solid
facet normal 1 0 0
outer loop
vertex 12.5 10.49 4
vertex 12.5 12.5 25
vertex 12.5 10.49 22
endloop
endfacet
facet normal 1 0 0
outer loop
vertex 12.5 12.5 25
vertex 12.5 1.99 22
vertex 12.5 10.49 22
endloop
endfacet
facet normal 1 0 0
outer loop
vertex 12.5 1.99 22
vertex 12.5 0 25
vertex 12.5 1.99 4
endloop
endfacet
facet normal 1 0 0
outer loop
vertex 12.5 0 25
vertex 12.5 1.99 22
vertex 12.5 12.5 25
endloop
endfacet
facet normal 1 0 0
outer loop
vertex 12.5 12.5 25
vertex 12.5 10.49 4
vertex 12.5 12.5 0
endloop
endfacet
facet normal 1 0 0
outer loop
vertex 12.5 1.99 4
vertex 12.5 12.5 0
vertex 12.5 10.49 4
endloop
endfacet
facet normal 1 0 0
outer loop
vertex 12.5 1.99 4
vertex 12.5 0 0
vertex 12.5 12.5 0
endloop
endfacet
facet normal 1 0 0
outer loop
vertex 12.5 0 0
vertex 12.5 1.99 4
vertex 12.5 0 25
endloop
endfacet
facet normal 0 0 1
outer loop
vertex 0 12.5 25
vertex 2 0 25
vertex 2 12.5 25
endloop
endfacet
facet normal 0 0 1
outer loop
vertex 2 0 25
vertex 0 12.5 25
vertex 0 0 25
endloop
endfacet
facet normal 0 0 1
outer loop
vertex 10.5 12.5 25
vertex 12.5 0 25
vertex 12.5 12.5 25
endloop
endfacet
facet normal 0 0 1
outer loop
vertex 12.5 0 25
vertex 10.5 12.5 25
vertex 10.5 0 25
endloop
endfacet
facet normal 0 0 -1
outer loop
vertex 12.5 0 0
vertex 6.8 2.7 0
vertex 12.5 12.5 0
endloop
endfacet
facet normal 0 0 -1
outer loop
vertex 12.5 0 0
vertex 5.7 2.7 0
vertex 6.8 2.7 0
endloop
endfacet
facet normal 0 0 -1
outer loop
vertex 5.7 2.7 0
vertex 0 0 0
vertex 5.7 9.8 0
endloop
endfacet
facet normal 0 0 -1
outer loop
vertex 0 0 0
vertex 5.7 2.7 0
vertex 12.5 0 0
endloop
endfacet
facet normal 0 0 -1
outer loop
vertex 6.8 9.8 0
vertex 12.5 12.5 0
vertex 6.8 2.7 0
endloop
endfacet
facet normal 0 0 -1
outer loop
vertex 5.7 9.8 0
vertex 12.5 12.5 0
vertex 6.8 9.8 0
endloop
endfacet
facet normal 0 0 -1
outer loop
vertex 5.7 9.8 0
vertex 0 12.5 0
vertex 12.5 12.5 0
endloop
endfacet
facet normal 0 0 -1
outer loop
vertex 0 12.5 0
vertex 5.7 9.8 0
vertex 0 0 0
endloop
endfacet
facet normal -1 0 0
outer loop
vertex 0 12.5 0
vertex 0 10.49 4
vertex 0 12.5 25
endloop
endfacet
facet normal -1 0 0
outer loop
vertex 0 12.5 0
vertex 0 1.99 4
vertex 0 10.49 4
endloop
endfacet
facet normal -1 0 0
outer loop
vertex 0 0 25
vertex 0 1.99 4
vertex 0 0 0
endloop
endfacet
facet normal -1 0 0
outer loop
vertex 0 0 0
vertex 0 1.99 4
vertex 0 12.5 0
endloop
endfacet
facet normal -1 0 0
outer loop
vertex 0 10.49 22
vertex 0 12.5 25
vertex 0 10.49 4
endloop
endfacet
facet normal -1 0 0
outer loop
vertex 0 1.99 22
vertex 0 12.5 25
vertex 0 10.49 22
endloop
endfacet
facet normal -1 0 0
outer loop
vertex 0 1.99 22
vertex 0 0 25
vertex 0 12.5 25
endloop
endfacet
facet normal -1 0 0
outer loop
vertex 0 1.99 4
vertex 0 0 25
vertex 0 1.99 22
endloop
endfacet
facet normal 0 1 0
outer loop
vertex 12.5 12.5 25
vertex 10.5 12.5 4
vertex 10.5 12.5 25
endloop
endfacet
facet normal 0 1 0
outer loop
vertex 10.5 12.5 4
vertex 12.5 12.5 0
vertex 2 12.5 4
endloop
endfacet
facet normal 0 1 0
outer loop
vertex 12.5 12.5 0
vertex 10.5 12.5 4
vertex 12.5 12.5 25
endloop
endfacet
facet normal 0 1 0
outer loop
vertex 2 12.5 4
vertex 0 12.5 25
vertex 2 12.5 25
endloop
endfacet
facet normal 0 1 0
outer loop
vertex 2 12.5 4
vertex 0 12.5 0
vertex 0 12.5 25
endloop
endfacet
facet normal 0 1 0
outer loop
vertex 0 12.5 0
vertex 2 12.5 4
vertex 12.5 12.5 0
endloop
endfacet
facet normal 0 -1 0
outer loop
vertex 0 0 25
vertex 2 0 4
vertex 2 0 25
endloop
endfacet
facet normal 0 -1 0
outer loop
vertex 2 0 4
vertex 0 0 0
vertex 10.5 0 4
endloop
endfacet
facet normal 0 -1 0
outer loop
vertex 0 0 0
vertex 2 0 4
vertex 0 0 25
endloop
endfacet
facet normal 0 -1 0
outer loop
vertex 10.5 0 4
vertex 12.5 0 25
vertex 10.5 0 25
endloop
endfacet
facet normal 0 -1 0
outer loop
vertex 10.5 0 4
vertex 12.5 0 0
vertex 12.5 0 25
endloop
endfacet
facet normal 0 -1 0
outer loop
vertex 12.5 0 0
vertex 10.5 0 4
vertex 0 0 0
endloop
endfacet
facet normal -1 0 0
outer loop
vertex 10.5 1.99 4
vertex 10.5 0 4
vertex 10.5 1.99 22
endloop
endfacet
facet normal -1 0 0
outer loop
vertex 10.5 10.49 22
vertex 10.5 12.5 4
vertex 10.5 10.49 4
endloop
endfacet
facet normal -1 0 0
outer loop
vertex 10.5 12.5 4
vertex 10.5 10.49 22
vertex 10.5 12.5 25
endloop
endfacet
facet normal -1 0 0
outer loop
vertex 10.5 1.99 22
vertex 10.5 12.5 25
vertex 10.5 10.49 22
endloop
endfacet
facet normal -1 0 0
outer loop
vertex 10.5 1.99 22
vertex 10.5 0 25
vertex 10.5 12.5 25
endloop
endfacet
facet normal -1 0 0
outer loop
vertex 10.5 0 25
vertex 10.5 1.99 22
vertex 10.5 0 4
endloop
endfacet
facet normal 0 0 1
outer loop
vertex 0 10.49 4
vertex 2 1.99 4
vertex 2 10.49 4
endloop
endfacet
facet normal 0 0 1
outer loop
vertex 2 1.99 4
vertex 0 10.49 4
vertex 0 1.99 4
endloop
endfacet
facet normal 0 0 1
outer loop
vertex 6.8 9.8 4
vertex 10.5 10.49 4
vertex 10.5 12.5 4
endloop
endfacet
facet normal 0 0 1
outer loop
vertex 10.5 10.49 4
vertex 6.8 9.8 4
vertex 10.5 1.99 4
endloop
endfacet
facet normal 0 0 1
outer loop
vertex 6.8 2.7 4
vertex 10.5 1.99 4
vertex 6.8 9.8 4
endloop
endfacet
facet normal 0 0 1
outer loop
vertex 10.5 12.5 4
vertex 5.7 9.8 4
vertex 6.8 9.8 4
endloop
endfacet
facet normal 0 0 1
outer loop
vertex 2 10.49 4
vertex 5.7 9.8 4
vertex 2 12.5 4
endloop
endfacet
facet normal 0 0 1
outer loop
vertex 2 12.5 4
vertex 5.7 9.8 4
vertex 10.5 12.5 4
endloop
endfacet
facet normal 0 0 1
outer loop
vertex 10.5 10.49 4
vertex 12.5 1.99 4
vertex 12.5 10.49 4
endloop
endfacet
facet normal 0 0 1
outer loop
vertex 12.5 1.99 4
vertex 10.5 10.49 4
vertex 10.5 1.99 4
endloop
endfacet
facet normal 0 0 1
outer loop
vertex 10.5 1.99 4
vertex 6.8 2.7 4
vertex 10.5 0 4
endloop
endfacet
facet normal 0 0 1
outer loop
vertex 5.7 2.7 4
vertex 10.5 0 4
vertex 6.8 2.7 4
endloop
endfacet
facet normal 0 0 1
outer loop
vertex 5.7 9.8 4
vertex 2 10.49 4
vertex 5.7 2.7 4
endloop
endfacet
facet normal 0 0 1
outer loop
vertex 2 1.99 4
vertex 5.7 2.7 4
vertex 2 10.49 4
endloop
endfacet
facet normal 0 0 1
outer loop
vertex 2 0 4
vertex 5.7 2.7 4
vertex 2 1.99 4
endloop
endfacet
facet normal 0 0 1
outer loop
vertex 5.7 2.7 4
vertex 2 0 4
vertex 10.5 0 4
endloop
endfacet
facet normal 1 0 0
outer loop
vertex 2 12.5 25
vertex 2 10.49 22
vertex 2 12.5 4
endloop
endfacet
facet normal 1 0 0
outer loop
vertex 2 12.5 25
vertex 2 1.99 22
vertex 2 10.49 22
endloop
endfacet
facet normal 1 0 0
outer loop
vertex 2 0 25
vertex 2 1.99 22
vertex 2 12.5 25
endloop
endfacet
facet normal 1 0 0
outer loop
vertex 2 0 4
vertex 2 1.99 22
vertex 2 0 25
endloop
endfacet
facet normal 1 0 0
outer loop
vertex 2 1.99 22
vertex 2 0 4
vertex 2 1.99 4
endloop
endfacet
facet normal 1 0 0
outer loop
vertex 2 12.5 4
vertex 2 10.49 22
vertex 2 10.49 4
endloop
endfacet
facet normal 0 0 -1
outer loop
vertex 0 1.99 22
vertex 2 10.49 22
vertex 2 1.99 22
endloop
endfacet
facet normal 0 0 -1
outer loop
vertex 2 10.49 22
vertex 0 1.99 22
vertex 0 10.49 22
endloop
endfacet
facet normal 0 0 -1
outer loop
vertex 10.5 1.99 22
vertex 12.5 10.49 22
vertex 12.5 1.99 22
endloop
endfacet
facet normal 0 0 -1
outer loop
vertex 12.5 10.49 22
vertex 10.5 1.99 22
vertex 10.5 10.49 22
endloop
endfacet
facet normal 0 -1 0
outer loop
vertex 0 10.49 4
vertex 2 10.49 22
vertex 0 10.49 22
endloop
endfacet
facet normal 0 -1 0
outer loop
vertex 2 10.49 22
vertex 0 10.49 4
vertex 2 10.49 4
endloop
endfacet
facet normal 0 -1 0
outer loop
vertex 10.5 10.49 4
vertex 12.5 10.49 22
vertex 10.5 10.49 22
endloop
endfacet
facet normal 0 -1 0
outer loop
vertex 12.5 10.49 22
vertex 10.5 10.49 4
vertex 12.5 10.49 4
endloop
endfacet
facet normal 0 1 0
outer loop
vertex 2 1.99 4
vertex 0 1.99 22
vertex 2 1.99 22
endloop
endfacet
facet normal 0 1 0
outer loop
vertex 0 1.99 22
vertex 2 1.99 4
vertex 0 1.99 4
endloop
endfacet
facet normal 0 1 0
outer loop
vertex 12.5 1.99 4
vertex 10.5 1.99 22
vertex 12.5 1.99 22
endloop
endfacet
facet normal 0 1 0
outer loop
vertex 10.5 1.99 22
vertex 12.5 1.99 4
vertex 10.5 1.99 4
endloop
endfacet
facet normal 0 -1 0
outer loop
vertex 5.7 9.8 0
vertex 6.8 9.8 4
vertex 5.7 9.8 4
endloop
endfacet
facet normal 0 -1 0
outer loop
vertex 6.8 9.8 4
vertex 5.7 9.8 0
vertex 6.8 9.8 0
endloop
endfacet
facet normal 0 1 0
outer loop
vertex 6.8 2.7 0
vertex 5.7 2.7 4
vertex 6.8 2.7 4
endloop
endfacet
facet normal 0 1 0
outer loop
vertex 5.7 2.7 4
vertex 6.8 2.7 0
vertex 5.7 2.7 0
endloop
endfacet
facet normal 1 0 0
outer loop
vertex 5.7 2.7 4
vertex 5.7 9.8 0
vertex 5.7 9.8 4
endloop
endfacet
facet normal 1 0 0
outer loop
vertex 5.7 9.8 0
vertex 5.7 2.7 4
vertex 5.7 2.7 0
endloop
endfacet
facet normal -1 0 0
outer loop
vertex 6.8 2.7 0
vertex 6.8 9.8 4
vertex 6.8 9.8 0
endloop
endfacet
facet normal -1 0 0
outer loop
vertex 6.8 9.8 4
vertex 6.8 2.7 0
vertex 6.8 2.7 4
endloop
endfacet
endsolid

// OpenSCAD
$fn=100;
d=0.01;

// cuvette box size

bx0 = 13;
by0 = 13;
bz0 = 25;

bx = bx0-0.5;
by = by0-0.5;
bz = bz0;

// electrode

ex0 = 7;
ey0 = 1;
ez0 = 23;
ez1 = 10;
ez2 = 19;

ex = ex0 + 0.1;
ey = ey0 + 0.1;
ez = ez0;

module electrode()
{
	difference()
	{
		cube([ex, ey, ez]);
		translate([ex/4, -d, ez1])
		cube([ex/2, ey+2*d, ez2-ez1]);
	}
}

module box()
{
	difference()
	{
		cube([bx, by, bz]);
		translate([2, -d, 4])
			cube([bx-4, by+2*d, bz-4+d]);
		translate([-d, 2-d, 4])
			cube([bx+2*d, by-4, bz-4-3]);
	}
}

difference()
{
	box();

	translate([bx/2+ey/2, by/2-ex/2, -d])
	rotate([0, 0, 90])
	electrode();
}
